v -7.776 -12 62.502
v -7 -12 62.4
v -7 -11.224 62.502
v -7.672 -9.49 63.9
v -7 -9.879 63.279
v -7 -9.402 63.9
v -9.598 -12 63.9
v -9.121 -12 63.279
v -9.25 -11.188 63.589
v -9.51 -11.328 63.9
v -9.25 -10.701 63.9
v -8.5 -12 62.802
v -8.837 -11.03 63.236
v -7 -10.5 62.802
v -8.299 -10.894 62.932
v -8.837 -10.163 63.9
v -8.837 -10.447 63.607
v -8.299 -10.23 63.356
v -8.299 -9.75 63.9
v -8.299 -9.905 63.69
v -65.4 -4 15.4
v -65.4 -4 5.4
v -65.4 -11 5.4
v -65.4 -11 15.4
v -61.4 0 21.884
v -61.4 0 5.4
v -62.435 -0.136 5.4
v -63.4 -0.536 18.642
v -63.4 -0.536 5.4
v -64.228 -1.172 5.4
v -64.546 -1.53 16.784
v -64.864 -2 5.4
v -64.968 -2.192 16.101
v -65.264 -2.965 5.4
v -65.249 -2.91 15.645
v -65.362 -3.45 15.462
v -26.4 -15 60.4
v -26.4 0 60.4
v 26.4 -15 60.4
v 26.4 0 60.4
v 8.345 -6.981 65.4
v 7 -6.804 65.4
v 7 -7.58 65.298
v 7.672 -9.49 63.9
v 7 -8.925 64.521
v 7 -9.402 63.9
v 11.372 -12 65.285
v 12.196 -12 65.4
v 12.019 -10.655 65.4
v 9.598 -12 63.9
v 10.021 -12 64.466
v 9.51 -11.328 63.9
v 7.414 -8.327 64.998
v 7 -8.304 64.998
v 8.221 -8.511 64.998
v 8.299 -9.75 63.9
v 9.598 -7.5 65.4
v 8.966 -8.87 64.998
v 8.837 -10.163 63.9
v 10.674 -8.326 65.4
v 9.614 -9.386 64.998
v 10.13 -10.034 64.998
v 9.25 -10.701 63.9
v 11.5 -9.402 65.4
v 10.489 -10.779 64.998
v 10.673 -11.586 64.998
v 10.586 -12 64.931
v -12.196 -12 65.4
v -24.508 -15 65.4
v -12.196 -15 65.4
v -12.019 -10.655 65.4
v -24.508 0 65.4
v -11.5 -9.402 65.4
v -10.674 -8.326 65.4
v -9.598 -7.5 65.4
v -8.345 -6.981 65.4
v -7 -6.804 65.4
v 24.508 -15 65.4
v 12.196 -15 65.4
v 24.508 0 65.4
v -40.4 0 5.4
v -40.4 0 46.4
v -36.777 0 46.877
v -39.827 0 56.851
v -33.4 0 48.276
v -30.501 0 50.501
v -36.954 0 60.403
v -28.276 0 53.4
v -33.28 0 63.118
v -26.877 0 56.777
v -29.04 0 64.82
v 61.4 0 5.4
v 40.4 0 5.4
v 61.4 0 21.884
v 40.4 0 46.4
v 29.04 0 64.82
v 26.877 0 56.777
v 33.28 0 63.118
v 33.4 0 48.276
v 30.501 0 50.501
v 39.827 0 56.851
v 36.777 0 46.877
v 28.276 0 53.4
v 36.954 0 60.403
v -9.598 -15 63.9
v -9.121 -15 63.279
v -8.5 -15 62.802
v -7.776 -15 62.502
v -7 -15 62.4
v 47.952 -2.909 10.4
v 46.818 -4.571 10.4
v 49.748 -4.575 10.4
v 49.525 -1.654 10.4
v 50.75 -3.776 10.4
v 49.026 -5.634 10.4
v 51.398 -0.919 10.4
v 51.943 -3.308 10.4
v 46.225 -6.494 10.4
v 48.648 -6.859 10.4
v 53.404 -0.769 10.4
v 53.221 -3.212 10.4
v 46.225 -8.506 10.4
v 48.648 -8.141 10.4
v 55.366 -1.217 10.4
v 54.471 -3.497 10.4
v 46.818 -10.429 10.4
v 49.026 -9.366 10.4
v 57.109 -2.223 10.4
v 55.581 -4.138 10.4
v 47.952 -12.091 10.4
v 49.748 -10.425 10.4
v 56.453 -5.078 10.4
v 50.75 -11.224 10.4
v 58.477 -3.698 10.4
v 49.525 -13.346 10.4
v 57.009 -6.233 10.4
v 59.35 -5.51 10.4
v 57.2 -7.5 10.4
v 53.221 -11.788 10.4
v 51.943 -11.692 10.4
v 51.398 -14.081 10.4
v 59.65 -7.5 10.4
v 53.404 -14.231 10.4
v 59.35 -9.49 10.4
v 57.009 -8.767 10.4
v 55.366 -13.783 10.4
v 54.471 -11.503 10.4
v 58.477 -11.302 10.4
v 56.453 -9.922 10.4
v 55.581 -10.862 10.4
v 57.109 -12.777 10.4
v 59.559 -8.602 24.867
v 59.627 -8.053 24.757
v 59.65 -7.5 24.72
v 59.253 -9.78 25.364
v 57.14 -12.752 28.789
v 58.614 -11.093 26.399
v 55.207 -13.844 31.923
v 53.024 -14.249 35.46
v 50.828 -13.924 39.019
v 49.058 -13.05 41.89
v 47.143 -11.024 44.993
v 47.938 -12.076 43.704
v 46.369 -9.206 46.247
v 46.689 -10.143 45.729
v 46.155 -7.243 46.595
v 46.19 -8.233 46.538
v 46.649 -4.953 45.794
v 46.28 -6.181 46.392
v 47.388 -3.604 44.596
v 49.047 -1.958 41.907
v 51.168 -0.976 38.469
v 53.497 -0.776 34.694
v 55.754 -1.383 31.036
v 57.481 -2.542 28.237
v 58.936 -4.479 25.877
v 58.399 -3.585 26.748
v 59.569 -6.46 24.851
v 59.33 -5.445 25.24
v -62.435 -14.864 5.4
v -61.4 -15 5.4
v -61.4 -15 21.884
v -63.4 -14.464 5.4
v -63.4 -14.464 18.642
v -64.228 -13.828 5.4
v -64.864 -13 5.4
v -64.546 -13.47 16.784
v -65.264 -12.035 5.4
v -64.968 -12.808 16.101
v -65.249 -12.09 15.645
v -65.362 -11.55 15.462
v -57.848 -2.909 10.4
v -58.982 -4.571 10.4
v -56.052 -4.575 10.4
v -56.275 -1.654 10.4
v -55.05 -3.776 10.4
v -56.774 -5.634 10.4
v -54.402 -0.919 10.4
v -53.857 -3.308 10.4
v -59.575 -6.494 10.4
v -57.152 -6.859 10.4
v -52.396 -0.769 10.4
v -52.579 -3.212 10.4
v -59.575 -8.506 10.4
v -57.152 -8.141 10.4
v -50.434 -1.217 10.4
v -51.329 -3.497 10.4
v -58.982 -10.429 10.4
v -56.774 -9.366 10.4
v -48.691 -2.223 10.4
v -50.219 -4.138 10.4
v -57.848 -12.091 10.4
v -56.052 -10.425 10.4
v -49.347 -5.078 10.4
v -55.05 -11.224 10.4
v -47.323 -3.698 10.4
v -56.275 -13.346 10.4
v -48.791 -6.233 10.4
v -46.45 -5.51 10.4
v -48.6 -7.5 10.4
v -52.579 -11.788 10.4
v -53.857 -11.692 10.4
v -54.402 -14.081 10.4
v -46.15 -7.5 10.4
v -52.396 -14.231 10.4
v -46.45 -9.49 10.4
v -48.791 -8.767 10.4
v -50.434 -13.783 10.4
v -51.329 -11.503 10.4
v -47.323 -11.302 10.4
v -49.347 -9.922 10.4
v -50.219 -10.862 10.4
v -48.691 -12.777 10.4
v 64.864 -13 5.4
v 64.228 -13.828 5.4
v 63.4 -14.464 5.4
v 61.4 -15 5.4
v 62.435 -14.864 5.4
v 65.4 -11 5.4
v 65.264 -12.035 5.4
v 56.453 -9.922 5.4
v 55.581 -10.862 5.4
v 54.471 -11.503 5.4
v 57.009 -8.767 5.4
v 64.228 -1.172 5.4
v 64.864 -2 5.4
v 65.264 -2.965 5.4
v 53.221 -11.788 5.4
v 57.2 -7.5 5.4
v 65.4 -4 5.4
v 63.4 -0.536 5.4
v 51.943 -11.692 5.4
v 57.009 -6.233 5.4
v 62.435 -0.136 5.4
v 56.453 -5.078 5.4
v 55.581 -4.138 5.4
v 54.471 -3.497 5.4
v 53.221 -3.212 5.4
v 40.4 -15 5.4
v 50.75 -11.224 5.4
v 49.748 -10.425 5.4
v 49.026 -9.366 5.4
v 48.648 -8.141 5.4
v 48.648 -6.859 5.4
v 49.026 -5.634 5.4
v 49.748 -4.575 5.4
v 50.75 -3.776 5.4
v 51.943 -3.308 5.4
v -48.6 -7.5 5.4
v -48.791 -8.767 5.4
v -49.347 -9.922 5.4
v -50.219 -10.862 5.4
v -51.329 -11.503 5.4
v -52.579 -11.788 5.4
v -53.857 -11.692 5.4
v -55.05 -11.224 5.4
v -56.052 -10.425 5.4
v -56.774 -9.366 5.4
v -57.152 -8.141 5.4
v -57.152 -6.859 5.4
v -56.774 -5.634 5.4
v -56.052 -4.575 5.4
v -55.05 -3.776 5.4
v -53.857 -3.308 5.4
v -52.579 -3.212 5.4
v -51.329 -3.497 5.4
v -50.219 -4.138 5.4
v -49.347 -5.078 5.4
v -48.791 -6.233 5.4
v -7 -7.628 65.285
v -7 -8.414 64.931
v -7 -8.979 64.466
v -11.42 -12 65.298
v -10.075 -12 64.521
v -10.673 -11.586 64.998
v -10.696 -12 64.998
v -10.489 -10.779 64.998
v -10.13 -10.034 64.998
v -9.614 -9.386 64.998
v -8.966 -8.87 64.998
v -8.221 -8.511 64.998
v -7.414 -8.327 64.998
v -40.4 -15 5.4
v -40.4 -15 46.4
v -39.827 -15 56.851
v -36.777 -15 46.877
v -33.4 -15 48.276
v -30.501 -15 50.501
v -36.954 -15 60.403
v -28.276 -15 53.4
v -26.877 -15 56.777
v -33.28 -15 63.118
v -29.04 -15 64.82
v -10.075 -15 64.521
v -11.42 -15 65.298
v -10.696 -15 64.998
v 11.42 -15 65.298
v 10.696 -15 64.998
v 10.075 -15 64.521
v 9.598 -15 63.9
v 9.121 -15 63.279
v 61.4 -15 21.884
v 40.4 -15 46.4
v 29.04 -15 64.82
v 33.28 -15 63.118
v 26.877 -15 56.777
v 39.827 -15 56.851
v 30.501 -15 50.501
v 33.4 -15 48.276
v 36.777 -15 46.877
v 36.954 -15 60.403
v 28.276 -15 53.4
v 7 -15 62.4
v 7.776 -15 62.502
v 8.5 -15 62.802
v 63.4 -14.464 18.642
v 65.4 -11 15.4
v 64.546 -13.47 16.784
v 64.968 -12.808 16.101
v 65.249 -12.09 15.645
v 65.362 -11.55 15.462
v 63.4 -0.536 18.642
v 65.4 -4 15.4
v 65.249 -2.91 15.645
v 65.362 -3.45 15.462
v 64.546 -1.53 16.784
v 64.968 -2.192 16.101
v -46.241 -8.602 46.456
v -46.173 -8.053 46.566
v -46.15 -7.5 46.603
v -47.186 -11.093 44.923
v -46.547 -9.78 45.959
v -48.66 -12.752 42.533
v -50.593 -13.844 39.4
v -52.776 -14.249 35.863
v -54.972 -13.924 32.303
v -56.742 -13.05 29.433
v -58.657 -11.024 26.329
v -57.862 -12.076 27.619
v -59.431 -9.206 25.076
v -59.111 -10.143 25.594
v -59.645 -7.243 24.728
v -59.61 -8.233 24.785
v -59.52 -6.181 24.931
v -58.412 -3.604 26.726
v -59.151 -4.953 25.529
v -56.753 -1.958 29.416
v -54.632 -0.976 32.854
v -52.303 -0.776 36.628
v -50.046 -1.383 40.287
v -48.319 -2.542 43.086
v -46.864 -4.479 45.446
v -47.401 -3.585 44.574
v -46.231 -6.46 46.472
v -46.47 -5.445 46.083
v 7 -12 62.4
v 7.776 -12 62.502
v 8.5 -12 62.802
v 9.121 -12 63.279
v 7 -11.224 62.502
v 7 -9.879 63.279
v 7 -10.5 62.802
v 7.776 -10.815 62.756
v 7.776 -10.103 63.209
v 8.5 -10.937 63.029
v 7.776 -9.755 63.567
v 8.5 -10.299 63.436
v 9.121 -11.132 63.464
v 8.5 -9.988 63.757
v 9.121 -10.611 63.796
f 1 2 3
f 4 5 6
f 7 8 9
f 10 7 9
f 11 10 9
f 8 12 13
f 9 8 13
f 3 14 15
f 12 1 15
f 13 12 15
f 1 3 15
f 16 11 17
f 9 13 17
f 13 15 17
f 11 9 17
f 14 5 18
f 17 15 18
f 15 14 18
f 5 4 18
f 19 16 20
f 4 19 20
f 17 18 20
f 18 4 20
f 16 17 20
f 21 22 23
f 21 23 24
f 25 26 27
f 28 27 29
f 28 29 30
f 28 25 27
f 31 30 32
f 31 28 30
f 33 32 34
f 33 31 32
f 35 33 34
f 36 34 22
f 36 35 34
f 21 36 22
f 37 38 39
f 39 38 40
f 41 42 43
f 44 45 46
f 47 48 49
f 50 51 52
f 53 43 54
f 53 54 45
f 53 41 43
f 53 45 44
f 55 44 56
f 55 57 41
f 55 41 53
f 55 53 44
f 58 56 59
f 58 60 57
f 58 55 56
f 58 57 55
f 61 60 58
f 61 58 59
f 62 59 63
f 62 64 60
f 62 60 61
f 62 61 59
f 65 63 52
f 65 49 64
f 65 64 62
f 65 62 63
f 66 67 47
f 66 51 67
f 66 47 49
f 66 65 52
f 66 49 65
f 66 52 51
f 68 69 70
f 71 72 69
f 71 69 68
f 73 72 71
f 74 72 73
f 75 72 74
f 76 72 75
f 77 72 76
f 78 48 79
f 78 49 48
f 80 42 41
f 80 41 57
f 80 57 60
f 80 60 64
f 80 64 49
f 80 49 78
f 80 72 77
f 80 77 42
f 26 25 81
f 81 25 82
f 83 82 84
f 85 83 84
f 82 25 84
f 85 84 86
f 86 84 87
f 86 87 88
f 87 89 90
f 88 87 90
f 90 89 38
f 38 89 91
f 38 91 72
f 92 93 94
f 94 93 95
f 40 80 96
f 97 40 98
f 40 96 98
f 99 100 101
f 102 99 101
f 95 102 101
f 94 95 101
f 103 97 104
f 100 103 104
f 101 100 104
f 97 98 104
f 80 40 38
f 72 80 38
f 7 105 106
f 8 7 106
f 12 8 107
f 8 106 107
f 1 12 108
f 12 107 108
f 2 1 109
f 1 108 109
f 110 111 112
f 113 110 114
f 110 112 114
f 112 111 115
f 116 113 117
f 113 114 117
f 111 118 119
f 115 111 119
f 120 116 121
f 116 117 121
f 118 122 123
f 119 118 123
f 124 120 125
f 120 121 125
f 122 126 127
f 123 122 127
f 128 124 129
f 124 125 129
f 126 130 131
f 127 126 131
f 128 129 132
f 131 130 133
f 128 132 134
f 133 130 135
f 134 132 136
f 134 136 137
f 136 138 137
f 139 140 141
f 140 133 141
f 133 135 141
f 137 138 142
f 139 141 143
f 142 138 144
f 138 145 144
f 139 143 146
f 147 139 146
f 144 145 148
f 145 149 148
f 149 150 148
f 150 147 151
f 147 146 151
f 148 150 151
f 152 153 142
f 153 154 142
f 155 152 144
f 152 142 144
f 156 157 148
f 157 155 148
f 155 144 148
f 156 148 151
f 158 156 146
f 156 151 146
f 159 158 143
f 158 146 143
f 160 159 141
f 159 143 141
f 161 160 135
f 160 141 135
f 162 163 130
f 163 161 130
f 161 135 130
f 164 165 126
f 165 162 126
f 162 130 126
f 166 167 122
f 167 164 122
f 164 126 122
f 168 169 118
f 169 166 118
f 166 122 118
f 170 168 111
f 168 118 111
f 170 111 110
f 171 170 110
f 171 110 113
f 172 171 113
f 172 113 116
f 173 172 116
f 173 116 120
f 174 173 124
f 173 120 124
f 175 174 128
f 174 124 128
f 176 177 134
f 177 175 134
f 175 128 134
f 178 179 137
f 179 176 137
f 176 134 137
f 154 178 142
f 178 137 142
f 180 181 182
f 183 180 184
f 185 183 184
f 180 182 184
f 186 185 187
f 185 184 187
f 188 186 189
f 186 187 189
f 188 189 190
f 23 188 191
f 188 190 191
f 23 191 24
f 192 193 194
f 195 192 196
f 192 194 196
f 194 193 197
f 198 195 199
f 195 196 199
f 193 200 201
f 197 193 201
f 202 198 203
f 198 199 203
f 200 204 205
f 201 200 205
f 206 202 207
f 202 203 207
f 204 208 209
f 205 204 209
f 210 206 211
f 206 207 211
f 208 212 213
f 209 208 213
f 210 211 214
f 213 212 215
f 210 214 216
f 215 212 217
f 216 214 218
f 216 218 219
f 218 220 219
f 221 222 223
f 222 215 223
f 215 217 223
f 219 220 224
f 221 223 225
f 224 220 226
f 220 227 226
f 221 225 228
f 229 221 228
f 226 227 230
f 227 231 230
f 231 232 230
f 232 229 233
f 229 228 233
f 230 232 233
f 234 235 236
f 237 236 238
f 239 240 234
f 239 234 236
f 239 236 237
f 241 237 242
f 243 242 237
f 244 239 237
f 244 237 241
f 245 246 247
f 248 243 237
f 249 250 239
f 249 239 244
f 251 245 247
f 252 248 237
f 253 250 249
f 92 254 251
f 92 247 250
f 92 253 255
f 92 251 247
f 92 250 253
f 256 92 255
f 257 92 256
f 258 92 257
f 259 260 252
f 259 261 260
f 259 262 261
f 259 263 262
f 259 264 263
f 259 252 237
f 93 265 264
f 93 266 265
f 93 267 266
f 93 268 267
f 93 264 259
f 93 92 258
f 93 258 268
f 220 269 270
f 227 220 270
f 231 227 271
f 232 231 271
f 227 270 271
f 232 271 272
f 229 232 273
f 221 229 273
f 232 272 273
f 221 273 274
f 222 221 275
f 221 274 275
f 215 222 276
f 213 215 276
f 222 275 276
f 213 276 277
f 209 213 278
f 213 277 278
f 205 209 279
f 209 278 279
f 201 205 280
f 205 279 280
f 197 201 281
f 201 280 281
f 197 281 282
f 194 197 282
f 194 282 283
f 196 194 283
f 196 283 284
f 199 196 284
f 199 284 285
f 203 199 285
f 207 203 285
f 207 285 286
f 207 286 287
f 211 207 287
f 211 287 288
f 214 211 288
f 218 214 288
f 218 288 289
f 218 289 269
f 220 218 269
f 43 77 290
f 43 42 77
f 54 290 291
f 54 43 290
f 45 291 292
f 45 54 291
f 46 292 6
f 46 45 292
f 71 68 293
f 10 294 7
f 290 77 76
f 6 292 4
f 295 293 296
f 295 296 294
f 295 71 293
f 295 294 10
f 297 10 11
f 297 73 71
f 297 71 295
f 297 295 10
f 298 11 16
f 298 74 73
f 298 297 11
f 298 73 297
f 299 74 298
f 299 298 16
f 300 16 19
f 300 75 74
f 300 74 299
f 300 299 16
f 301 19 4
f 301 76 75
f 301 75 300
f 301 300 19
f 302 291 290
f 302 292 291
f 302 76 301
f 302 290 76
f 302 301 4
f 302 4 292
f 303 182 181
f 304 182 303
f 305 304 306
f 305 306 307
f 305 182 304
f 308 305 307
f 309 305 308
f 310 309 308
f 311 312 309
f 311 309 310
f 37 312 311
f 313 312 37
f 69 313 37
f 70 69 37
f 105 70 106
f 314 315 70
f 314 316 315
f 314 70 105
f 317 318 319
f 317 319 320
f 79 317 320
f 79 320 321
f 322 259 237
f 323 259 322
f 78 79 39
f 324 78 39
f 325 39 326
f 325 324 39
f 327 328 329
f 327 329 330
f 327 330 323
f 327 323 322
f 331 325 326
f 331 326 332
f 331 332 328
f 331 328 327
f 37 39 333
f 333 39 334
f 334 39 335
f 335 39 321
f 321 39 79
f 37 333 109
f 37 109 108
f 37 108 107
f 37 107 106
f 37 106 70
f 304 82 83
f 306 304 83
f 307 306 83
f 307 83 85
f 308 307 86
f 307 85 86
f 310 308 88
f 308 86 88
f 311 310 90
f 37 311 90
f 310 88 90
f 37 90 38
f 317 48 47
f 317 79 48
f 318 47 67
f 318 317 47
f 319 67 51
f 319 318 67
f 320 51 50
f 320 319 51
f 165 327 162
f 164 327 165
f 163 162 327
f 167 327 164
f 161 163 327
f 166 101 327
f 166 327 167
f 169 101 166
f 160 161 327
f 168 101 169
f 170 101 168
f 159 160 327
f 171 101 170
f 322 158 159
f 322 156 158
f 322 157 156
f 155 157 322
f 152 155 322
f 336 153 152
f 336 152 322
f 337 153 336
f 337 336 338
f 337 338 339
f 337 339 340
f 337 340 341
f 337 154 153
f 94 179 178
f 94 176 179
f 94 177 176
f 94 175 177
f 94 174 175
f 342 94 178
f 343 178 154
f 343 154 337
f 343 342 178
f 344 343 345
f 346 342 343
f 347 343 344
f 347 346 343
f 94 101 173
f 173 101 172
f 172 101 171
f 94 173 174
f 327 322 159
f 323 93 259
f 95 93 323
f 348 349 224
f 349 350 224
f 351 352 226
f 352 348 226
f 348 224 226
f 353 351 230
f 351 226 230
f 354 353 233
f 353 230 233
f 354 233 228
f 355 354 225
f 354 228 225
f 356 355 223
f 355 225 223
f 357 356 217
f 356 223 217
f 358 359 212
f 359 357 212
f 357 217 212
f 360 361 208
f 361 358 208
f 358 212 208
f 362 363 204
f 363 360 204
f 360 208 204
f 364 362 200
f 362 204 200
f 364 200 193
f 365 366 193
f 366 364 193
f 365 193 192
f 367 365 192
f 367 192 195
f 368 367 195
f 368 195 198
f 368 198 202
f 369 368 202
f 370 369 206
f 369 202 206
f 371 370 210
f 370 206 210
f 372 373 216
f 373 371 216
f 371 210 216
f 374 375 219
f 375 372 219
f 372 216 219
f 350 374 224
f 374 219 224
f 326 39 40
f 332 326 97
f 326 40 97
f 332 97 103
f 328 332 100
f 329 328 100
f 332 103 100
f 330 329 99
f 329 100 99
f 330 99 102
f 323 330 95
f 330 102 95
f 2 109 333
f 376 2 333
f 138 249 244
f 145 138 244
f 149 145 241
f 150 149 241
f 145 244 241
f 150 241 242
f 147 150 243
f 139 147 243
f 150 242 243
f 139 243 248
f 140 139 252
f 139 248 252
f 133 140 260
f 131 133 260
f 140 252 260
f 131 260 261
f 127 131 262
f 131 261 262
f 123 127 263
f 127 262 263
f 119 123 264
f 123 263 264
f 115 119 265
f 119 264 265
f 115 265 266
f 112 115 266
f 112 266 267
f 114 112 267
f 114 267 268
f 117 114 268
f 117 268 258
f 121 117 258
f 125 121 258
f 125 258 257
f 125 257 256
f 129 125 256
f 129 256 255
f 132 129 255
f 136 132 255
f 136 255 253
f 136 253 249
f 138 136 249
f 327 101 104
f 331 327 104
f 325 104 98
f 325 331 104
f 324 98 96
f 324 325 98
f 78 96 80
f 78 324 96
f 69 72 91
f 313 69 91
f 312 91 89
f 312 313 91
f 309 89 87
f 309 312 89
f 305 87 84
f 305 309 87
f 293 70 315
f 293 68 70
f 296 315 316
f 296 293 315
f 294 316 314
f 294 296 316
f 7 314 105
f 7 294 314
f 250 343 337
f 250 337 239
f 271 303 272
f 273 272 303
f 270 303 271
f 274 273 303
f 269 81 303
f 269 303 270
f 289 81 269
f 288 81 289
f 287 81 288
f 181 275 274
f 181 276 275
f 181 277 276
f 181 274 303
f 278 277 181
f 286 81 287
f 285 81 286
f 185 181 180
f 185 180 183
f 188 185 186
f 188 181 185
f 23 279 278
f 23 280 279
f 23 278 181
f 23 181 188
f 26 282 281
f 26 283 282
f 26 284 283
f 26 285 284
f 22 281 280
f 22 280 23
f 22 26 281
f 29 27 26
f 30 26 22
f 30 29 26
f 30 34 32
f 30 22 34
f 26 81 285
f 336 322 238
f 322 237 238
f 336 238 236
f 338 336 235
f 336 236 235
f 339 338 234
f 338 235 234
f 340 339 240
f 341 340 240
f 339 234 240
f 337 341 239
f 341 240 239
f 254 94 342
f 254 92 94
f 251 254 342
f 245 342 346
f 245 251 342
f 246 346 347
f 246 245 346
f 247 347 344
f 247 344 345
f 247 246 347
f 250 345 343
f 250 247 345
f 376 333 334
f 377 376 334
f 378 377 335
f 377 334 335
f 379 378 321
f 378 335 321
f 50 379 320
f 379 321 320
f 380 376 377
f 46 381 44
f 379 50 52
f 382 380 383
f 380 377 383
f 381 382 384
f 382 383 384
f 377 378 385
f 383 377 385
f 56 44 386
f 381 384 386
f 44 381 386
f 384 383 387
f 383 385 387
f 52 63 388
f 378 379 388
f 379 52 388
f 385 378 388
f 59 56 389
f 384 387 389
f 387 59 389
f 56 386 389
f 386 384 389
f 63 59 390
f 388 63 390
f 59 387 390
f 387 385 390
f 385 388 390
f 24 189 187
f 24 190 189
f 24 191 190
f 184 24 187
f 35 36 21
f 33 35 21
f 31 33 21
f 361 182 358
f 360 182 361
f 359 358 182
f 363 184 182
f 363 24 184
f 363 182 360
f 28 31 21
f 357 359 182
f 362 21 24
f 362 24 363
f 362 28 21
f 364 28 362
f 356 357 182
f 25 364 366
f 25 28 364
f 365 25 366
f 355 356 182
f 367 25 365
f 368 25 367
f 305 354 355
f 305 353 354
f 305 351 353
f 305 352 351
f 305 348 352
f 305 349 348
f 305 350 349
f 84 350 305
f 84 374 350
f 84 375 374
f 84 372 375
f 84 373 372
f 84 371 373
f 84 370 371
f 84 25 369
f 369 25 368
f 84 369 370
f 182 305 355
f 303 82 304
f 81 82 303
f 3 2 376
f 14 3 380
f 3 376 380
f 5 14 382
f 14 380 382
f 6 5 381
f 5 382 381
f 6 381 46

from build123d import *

# Parameters (mm, degrees)
PAD_DEPTH       = 15
SKETCH001_R     = 4.3
POCKET_DEPTH    = 60.001
SKETCH002_R     = 6.75
POCKET001_DEPTH = 55.001
FILLET_R        = 4
FILLET001_R     = 18
POCKET002_DEPTH = 3
GROOVE_ANGLE    = 90
FILLET002_R     = 3


with BuildPart() as part:
    # Sketch → Pad (new body)
    with BuildSketch(Plane.XZ):
        with BuildLine():
            ThreePointArc((-40.4, 46.4), (-30.500505, 50.500505), (-26.4, 60.4))
            Line((-26.4, 60.4), (26.4, 60.4))
            ThreePointArc((26.4, 60.4), (30.500505, 50.500505), (40.4, 46.4))
            Line((40.4, 5.4), (40.4, 46.4))
            Line((65.4, 5.4), (40.4, 5.4))
            Line((65.4, 15.4), (65.4, 5.4))
            Line((34.553176, 65.4), (65.4, 15.4))
            Line((-34.553176, 65.4), (34.553176, 65.4))
            Line((-65.4, 15.4), (-34.553176, 65.4))
            Line((-65.4, 5.4), (-65.4, 15.4))
            Line((-40.4, 5.4), (-65.4, 5.4))
            Line((-40.4, 46.4), (-40.4, 5.4))
        make_face()
    extrude(amount=PAD_DEPTH)

    # Sketch001 (on Face11 of Pad) → Pocket (cut, through all)
    with BuildSketch(Plane(origin=(0, 0, 5.4), x_dir=(1, 0, 0), z_dir=(0, 0, -1))):
        with Locations((-52.9, 7.5)):
            Circle(SKETCH001_R)
        with Locations((52.9, 7.5)):
            Circle(SKETCH001_R)
    extrude(amount=-POCKET_DEPTH, mode=Mode.SUBTRACT)

    # Sketch002 (on Face6 of Pocket) → Pocket001 (cut, through all)
    with BuildSketch(Plane(origin=(0, 0, 10.4), x_dir=(1, 0, 0), z_dir=(0, 0, -1))):
        with Locations((-52.9, 7.5)):
            Circle(SKETCH002_R)
        with Locations((52.9, 7.5)):
            Circle(SKETCH002_R)
    extrude(amount=-POCKET001_DEPTH, mode=Mode.SUBTRACT)

    # Fillet
    fillet_edges = [part.edges().sort_by_distance(p)[0] for p in [
        (-65.4, -15, 10.4),
        (-65.4, 0, 10.4),
        (65.4, -15, 10.4),
        (65.4, 0, 10.4),
    ]]
    fillet(fillet_edges, radius=FILLET_R)

    # Fillet001
    fillet001_edges = [part.edges().sort_by_distance(p)[0] for p in [
        (-34.553176, -7.5, 65.4),
        (34.553176, -7.5, 65.4),
    ]]
    fillet(fillet001_edges, radius=FILLET001_R)

    # Sketch003 (on Face16 of Fillet001) → Pocket002 (cut)
    with BuildSketch(Plane.XZ.offset(15)):
        with BuildLine():
            ThreePointArc((-10, 65.4), (-9.12132, 63.27868), (-7, 62.4))
            Line((-7, 62.4), (7, 62.4))
            ThreePointArc((7, 62.4), (9.12132, 63.27868), (10, 65.4))
            Line((-10, 65.4), (10, 65.4))
        make_face()
    extrude(amount=-POCKET002_DEPTH, mode=Mode.SUBTRACT)

    # Pocket002 Face21 → Groove (revolve, cut)
    with BuildSketch(Plane(origin=(0, -12, 63.957106), x_dir=(-1, 0, 0), z_dir=(0, -1, 0))):
        with BuildLine():
            ThreePointArc((10, -1.442894), (9.12132, 0.678426), (7, 1.557106))
            Line((7, 1.557106), (-7, 1.557106))
            ThreePointArc((-7, 1.557106), (-9.12132, 0.678426), (-10, -1.442894))
            Line((-10, -1.442894), (10, -1.442894))
        make_face()
    revolve(axis=Axis((0, -12, 65.4), (1, 0, 0)), revolution_arc=GROOVE_ANGLE, mode=Mode.SUBTRACT)

    # Fillet002
    fillet002_edges = [part.edges().sort_by_distance(p)[0] for p in [
        (0, -9, 65.4),
    ]]
    fillet(fillet002_edges, radius=FILLET002_R)


solid = part.part
